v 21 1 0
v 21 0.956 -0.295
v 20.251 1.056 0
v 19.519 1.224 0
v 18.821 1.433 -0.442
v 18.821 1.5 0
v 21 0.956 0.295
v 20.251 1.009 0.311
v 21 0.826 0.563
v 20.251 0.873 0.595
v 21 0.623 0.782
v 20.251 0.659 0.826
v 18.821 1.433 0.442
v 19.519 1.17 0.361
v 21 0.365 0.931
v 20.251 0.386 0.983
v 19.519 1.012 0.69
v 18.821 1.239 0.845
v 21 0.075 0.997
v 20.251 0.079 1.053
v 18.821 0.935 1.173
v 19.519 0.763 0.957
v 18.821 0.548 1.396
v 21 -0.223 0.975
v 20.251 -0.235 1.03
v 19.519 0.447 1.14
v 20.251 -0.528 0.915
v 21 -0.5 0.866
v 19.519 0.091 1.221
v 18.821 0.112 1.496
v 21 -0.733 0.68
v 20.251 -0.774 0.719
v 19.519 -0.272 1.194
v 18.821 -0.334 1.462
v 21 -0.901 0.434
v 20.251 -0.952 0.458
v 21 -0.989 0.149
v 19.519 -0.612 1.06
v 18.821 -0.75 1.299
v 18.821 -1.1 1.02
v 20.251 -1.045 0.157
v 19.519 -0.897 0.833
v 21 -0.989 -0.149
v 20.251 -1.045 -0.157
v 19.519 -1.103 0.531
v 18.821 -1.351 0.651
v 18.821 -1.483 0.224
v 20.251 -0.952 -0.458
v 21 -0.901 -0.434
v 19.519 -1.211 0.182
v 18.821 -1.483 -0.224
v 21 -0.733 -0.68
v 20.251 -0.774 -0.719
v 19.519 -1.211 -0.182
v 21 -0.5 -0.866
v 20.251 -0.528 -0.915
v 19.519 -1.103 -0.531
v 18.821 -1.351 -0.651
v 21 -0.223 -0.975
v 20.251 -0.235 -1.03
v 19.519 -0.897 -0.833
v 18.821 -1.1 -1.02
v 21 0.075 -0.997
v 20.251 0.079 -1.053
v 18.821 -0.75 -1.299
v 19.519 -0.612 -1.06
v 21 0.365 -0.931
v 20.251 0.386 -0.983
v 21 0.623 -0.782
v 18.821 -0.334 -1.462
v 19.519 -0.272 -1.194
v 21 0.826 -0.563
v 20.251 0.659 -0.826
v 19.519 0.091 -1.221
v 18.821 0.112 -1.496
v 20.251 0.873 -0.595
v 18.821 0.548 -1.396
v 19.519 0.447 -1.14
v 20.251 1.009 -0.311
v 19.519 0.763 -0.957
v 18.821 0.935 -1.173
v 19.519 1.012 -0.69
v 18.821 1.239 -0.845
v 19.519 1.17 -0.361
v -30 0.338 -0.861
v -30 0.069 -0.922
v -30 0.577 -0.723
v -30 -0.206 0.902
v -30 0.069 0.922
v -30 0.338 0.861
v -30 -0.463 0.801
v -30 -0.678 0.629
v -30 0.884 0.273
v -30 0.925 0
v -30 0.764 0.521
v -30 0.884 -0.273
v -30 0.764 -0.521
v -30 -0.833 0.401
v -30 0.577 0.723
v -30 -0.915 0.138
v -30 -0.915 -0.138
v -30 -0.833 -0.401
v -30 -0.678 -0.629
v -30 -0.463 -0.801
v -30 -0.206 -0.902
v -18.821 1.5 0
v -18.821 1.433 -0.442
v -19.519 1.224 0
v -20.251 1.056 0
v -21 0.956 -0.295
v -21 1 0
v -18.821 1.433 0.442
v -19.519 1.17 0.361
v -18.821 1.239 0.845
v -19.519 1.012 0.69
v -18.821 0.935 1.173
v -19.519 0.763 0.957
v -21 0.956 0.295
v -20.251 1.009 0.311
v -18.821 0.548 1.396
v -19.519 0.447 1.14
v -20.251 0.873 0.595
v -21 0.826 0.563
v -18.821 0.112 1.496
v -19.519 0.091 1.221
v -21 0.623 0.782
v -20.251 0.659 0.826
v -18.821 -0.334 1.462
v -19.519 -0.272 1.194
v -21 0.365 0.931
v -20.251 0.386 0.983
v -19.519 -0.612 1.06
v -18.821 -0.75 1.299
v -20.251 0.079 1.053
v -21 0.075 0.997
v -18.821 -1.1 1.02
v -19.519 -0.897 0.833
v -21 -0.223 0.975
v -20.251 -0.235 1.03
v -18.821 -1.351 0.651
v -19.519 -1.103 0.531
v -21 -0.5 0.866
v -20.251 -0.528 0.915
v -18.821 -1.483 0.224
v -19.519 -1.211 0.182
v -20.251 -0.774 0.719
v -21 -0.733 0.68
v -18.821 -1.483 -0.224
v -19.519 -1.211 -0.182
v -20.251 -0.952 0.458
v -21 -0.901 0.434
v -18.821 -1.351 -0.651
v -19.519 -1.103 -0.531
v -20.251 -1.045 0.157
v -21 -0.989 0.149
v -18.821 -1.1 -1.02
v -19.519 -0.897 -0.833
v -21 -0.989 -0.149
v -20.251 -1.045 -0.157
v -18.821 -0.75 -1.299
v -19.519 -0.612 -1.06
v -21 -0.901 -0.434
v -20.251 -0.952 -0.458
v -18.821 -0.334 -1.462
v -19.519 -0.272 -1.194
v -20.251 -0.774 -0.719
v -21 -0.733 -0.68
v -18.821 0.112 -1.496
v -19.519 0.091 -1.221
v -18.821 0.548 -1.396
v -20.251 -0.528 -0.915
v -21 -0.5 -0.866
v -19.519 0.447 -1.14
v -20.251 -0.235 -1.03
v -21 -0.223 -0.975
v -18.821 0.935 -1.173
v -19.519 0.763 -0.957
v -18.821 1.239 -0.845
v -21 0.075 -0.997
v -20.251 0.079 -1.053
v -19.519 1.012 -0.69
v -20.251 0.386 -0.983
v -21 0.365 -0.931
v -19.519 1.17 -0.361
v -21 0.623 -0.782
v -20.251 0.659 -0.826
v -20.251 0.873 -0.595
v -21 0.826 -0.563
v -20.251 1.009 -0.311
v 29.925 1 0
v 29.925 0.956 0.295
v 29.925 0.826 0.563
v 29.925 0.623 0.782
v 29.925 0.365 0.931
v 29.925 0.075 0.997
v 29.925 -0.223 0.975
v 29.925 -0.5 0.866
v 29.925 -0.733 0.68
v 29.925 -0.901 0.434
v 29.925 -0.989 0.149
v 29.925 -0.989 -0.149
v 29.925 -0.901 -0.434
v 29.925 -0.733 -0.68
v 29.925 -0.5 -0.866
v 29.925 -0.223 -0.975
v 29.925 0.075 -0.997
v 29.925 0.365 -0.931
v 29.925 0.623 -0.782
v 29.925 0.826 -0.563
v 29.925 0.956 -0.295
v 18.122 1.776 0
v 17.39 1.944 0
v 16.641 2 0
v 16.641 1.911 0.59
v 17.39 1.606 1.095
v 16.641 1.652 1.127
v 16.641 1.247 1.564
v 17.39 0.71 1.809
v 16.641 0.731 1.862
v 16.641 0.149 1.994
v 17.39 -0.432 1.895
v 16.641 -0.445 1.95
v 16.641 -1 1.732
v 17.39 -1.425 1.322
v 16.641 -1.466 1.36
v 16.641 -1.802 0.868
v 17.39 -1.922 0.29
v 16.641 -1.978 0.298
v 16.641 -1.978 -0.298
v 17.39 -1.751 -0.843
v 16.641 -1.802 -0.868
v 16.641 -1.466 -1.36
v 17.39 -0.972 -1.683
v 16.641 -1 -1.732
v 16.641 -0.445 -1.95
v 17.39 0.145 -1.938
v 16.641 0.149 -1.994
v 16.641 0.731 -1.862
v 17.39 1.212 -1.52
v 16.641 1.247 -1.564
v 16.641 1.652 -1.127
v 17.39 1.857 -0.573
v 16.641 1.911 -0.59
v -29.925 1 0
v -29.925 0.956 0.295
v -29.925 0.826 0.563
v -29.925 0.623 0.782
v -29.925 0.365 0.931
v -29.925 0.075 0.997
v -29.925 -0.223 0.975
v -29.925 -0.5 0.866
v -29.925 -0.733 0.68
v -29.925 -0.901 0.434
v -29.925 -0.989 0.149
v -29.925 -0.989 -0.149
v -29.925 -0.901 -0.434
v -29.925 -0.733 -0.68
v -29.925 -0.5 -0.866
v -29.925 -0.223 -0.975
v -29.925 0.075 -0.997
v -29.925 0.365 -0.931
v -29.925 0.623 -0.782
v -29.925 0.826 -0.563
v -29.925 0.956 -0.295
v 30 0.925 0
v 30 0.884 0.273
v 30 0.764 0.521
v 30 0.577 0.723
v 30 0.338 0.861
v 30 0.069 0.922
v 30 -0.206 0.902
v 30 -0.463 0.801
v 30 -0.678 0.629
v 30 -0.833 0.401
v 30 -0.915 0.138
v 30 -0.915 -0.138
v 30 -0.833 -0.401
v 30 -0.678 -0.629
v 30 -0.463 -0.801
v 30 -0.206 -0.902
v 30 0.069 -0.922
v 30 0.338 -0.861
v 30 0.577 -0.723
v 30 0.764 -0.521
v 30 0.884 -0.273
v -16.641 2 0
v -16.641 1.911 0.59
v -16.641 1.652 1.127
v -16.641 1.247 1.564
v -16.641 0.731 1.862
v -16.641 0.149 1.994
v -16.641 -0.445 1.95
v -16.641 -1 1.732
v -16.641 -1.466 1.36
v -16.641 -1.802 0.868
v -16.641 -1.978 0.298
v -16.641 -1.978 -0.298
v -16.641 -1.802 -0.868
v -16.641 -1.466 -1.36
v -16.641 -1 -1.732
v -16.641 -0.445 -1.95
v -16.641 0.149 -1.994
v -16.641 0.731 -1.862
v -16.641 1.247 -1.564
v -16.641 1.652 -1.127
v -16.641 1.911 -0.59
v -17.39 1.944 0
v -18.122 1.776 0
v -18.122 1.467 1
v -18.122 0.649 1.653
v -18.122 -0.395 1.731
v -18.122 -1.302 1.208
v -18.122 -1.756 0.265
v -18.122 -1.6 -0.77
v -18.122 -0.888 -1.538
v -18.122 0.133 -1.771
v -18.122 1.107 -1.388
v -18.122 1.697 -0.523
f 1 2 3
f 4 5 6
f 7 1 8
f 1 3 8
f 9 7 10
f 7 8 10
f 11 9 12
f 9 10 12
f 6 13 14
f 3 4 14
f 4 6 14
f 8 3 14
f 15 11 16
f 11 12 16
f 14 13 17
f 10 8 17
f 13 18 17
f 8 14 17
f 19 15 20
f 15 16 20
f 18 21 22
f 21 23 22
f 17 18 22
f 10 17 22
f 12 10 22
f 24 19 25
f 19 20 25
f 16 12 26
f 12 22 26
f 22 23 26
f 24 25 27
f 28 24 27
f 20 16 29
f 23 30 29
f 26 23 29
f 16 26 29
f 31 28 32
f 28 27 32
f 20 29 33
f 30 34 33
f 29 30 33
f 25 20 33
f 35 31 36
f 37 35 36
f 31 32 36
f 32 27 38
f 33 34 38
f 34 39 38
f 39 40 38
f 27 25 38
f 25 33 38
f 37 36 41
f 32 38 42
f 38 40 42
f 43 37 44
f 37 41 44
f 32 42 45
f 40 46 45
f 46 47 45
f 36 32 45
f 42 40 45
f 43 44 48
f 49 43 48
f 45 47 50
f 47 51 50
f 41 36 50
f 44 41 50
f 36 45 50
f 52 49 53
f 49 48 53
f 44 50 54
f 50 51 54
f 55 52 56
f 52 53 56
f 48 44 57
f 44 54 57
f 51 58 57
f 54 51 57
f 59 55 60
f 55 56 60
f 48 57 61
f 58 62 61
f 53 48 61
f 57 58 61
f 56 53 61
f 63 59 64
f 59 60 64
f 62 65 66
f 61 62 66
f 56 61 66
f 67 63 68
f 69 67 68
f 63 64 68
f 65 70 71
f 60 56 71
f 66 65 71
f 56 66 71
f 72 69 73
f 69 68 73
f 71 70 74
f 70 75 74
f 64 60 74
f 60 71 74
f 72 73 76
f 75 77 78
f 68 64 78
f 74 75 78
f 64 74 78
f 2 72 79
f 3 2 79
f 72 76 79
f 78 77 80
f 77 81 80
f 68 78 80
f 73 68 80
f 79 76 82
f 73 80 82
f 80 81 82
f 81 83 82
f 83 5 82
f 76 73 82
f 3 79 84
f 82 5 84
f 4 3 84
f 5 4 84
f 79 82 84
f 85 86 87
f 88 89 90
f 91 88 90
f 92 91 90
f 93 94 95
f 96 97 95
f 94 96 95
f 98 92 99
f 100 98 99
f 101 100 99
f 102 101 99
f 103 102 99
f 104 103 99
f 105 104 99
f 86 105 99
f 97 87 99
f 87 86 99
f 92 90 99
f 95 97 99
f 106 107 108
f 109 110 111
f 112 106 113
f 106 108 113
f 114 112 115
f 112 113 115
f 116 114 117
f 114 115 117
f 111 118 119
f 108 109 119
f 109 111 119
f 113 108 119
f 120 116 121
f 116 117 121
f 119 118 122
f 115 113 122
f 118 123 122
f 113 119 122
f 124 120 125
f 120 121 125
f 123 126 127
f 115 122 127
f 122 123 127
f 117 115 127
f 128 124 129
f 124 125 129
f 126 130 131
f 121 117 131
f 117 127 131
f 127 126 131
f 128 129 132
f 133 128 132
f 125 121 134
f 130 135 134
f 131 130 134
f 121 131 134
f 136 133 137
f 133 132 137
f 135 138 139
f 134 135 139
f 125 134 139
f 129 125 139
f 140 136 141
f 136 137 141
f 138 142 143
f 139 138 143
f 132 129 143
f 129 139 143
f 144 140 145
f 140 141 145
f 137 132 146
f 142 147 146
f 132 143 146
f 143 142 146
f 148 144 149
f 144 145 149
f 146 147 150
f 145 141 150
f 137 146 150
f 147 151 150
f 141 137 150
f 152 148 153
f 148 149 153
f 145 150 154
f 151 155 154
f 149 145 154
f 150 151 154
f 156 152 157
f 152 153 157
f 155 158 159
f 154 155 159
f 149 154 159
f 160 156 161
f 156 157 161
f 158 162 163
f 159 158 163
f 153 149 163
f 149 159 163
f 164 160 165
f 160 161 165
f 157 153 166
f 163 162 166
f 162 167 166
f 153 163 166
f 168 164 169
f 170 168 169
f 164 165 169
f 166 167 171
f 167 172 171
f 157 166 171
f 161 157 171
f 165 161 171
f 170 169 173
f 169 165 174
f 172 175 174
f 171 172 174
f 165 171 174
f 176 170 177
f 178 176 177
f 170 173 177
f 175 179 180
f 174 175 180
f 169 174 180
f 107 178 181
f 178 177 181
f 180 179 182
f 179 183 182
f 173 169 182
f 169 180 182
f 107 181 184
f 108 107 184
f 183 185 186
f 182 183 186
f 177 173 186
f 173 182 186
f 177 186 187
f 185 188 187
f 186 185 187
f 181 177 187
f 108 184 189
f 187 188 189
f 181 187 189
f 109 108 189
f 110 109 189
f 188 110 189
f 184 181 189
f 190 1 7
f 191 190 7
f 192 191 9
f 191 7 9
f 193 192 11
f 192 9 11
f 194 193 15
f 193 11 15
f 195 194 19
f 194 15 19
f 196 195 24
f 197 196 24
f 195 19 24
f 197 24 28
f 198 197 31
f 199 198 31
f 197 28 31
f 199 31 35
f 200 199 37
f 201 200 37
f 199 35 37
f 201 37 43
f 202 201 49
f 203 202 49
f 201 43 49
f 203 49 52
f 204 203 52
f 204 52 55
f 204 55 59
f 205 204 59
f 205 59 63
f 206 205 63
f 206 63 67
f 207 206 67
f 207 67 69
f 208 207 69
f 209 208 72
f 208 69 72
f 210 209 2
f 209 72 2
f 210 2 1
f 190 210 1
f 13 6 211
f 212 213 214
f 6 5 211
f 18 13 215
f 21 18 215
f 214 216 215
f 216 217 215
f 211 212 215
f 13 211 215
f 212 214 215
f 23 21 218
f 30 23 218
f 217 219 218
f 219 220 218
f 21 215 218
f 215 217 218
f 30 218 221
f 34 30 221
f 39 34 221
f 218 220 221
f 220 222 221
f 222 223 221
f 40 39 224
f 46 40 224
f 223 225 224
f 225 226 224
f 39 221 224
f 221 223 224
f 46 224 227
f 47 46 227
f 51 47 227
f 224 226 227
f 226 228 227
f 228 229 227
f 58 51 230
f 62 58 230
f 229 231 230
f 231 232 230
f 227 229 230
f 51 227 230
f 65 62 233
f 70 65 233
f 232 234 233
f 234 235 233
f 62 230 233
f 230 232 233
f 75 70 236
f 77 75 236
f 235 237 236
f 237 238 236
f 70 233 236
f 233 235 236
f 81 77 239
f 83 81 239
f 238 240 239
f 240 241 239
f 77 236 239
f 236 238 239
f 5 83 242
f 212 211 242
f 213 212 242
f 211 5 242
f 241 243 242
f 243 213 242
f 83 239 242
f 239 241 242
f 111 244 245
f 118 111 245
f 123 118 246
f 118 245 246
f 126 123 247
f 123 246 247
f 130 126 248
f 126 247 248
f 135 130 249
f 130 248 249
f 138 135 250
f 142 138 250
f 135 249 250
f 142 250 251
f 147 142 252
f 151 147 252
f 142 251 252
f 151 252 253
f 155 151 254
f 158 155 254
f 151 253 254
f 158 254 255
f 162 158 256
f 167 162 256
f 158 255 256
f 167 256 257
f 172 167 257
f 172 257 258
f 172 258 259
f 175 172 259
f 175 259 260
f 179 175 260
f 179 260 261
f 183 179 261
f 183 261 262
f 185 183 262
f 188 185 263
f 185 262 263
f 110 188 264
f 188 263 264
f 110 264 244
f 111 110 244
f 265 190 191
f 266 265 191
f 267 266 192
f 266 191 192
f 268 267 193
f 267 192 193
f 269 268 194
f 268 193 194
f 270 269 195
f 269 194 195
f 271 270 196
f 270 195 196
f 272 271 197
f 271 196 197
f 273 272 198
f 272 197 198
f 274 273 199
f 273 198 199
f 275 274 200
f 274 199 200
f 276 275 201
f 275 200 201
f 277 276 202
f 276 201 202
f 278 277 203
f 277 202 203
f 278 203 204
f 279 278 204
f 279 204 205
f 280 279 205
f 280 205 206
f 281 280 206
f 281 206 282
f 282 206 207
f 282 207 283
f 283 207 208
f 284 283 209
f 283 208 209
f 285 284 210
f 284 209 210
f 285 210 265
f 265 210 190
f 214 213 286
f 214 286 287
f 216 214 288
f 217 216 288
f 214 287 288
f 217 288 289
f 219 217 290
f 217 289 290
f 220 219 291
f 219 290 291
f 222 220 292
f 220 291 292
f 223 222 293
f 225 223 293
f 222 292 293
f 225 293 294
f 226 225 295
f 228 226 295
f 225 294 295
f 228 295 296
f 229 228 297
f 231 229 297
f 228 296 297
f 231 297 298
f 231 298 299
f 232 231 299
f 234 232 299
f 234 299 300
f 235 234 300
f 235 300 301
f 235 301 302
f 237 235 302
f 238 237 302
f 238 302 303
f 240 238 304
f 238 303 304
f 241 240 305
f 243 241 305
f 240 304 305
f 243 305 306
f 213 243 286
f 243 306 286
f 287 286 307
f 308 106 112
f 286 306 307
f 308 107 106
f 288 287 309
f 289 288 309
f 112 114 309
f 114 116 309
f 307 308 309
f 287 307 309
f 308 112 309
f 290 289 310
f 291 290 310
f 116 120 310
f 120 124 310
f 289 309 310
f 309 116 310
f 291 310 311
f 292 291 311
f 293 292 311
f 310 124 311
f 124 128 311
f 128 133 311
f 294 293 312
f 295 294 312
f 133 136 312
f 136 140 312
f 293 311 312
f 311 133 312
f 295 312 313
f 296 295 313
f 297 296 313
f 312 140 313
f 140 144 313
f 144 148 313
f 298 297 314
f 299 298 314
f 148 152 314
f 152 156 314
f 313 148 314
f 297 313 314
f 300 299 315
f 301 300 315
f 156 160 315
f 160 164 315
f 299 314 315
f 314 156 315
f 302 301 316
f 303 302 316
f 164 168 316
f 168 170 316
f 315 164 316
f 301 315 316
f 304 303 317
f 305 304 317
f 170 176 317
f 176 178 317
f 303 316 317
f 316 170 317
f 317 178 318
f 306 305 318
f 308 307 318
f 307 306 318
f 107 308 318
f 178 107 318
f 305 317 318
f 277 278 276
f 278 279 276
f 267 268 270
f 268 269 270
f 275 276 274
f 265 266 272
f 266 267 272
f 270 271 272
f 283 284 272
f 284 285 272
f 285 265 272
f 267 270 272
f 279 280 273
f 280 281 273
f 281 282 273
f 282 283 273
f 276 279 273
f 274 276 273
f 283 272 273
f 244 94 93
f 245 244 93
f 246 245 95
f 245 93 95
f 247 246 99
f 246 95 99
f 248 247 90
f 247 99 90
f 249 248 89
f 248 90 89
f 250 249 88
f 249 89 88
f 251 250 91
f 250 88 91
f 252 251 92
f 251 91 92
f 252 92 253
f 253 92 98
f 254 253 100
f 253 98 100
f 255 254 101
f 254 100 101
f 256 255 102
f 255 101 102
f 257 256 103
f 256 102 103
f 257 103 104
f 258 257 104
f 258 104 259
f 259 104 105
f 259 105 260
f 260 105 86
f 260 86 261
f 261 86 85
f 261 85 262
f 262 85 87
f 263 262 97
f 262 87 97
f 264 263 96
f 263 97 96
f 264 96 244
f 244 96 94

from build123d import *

# Parameters (mm, degrees)
CHAMFER1_SIZE = 0.075


with BuildPart() as part:
    # Sketch1 → Revolve1 (revolve)
    with BuildSketch(Plane.XY):
        with BuildLine():
            Line((-30, 0), (30, 0))
            Line((30, 0), (30, 1))
            Line((30, 1), (21, 1))
            ThreePointArc((21, 1), (19.881966011, 1.126602828), (18.820550528, 1.5))
            ThreePointArc((18.820550528, 1.5), (17.759135045, 1.873397172), (16.641101056, 2))
            Line((16.641101056, 2), (-16.641101056, 2))
            ThreePointArc((-16.641101056, 2), (-17.759135045, 1.873397172), (-18.820550528, 1.5))
            ThreePointArc((-18.820550528, 1.5), (-19.881966011, 1.126602828), (-21, 1))
            Line((-21, 1), (-30, 1))
            Line((-30, 1), (-30, 0))
        make_face()
    revolve(axis=Axis((-30, 0, 0), (1, 0, 0)))

    # Chamfer1
    chamfer1_edges = [part.edges().sort_by_distance(p)[0] for p in [
        (-30, -1, 0),
        (30, -1, 0),
    ]]
    chamfer(chamfer1_edges, length=CHAMFER1_SIZE)


solid = part.part
